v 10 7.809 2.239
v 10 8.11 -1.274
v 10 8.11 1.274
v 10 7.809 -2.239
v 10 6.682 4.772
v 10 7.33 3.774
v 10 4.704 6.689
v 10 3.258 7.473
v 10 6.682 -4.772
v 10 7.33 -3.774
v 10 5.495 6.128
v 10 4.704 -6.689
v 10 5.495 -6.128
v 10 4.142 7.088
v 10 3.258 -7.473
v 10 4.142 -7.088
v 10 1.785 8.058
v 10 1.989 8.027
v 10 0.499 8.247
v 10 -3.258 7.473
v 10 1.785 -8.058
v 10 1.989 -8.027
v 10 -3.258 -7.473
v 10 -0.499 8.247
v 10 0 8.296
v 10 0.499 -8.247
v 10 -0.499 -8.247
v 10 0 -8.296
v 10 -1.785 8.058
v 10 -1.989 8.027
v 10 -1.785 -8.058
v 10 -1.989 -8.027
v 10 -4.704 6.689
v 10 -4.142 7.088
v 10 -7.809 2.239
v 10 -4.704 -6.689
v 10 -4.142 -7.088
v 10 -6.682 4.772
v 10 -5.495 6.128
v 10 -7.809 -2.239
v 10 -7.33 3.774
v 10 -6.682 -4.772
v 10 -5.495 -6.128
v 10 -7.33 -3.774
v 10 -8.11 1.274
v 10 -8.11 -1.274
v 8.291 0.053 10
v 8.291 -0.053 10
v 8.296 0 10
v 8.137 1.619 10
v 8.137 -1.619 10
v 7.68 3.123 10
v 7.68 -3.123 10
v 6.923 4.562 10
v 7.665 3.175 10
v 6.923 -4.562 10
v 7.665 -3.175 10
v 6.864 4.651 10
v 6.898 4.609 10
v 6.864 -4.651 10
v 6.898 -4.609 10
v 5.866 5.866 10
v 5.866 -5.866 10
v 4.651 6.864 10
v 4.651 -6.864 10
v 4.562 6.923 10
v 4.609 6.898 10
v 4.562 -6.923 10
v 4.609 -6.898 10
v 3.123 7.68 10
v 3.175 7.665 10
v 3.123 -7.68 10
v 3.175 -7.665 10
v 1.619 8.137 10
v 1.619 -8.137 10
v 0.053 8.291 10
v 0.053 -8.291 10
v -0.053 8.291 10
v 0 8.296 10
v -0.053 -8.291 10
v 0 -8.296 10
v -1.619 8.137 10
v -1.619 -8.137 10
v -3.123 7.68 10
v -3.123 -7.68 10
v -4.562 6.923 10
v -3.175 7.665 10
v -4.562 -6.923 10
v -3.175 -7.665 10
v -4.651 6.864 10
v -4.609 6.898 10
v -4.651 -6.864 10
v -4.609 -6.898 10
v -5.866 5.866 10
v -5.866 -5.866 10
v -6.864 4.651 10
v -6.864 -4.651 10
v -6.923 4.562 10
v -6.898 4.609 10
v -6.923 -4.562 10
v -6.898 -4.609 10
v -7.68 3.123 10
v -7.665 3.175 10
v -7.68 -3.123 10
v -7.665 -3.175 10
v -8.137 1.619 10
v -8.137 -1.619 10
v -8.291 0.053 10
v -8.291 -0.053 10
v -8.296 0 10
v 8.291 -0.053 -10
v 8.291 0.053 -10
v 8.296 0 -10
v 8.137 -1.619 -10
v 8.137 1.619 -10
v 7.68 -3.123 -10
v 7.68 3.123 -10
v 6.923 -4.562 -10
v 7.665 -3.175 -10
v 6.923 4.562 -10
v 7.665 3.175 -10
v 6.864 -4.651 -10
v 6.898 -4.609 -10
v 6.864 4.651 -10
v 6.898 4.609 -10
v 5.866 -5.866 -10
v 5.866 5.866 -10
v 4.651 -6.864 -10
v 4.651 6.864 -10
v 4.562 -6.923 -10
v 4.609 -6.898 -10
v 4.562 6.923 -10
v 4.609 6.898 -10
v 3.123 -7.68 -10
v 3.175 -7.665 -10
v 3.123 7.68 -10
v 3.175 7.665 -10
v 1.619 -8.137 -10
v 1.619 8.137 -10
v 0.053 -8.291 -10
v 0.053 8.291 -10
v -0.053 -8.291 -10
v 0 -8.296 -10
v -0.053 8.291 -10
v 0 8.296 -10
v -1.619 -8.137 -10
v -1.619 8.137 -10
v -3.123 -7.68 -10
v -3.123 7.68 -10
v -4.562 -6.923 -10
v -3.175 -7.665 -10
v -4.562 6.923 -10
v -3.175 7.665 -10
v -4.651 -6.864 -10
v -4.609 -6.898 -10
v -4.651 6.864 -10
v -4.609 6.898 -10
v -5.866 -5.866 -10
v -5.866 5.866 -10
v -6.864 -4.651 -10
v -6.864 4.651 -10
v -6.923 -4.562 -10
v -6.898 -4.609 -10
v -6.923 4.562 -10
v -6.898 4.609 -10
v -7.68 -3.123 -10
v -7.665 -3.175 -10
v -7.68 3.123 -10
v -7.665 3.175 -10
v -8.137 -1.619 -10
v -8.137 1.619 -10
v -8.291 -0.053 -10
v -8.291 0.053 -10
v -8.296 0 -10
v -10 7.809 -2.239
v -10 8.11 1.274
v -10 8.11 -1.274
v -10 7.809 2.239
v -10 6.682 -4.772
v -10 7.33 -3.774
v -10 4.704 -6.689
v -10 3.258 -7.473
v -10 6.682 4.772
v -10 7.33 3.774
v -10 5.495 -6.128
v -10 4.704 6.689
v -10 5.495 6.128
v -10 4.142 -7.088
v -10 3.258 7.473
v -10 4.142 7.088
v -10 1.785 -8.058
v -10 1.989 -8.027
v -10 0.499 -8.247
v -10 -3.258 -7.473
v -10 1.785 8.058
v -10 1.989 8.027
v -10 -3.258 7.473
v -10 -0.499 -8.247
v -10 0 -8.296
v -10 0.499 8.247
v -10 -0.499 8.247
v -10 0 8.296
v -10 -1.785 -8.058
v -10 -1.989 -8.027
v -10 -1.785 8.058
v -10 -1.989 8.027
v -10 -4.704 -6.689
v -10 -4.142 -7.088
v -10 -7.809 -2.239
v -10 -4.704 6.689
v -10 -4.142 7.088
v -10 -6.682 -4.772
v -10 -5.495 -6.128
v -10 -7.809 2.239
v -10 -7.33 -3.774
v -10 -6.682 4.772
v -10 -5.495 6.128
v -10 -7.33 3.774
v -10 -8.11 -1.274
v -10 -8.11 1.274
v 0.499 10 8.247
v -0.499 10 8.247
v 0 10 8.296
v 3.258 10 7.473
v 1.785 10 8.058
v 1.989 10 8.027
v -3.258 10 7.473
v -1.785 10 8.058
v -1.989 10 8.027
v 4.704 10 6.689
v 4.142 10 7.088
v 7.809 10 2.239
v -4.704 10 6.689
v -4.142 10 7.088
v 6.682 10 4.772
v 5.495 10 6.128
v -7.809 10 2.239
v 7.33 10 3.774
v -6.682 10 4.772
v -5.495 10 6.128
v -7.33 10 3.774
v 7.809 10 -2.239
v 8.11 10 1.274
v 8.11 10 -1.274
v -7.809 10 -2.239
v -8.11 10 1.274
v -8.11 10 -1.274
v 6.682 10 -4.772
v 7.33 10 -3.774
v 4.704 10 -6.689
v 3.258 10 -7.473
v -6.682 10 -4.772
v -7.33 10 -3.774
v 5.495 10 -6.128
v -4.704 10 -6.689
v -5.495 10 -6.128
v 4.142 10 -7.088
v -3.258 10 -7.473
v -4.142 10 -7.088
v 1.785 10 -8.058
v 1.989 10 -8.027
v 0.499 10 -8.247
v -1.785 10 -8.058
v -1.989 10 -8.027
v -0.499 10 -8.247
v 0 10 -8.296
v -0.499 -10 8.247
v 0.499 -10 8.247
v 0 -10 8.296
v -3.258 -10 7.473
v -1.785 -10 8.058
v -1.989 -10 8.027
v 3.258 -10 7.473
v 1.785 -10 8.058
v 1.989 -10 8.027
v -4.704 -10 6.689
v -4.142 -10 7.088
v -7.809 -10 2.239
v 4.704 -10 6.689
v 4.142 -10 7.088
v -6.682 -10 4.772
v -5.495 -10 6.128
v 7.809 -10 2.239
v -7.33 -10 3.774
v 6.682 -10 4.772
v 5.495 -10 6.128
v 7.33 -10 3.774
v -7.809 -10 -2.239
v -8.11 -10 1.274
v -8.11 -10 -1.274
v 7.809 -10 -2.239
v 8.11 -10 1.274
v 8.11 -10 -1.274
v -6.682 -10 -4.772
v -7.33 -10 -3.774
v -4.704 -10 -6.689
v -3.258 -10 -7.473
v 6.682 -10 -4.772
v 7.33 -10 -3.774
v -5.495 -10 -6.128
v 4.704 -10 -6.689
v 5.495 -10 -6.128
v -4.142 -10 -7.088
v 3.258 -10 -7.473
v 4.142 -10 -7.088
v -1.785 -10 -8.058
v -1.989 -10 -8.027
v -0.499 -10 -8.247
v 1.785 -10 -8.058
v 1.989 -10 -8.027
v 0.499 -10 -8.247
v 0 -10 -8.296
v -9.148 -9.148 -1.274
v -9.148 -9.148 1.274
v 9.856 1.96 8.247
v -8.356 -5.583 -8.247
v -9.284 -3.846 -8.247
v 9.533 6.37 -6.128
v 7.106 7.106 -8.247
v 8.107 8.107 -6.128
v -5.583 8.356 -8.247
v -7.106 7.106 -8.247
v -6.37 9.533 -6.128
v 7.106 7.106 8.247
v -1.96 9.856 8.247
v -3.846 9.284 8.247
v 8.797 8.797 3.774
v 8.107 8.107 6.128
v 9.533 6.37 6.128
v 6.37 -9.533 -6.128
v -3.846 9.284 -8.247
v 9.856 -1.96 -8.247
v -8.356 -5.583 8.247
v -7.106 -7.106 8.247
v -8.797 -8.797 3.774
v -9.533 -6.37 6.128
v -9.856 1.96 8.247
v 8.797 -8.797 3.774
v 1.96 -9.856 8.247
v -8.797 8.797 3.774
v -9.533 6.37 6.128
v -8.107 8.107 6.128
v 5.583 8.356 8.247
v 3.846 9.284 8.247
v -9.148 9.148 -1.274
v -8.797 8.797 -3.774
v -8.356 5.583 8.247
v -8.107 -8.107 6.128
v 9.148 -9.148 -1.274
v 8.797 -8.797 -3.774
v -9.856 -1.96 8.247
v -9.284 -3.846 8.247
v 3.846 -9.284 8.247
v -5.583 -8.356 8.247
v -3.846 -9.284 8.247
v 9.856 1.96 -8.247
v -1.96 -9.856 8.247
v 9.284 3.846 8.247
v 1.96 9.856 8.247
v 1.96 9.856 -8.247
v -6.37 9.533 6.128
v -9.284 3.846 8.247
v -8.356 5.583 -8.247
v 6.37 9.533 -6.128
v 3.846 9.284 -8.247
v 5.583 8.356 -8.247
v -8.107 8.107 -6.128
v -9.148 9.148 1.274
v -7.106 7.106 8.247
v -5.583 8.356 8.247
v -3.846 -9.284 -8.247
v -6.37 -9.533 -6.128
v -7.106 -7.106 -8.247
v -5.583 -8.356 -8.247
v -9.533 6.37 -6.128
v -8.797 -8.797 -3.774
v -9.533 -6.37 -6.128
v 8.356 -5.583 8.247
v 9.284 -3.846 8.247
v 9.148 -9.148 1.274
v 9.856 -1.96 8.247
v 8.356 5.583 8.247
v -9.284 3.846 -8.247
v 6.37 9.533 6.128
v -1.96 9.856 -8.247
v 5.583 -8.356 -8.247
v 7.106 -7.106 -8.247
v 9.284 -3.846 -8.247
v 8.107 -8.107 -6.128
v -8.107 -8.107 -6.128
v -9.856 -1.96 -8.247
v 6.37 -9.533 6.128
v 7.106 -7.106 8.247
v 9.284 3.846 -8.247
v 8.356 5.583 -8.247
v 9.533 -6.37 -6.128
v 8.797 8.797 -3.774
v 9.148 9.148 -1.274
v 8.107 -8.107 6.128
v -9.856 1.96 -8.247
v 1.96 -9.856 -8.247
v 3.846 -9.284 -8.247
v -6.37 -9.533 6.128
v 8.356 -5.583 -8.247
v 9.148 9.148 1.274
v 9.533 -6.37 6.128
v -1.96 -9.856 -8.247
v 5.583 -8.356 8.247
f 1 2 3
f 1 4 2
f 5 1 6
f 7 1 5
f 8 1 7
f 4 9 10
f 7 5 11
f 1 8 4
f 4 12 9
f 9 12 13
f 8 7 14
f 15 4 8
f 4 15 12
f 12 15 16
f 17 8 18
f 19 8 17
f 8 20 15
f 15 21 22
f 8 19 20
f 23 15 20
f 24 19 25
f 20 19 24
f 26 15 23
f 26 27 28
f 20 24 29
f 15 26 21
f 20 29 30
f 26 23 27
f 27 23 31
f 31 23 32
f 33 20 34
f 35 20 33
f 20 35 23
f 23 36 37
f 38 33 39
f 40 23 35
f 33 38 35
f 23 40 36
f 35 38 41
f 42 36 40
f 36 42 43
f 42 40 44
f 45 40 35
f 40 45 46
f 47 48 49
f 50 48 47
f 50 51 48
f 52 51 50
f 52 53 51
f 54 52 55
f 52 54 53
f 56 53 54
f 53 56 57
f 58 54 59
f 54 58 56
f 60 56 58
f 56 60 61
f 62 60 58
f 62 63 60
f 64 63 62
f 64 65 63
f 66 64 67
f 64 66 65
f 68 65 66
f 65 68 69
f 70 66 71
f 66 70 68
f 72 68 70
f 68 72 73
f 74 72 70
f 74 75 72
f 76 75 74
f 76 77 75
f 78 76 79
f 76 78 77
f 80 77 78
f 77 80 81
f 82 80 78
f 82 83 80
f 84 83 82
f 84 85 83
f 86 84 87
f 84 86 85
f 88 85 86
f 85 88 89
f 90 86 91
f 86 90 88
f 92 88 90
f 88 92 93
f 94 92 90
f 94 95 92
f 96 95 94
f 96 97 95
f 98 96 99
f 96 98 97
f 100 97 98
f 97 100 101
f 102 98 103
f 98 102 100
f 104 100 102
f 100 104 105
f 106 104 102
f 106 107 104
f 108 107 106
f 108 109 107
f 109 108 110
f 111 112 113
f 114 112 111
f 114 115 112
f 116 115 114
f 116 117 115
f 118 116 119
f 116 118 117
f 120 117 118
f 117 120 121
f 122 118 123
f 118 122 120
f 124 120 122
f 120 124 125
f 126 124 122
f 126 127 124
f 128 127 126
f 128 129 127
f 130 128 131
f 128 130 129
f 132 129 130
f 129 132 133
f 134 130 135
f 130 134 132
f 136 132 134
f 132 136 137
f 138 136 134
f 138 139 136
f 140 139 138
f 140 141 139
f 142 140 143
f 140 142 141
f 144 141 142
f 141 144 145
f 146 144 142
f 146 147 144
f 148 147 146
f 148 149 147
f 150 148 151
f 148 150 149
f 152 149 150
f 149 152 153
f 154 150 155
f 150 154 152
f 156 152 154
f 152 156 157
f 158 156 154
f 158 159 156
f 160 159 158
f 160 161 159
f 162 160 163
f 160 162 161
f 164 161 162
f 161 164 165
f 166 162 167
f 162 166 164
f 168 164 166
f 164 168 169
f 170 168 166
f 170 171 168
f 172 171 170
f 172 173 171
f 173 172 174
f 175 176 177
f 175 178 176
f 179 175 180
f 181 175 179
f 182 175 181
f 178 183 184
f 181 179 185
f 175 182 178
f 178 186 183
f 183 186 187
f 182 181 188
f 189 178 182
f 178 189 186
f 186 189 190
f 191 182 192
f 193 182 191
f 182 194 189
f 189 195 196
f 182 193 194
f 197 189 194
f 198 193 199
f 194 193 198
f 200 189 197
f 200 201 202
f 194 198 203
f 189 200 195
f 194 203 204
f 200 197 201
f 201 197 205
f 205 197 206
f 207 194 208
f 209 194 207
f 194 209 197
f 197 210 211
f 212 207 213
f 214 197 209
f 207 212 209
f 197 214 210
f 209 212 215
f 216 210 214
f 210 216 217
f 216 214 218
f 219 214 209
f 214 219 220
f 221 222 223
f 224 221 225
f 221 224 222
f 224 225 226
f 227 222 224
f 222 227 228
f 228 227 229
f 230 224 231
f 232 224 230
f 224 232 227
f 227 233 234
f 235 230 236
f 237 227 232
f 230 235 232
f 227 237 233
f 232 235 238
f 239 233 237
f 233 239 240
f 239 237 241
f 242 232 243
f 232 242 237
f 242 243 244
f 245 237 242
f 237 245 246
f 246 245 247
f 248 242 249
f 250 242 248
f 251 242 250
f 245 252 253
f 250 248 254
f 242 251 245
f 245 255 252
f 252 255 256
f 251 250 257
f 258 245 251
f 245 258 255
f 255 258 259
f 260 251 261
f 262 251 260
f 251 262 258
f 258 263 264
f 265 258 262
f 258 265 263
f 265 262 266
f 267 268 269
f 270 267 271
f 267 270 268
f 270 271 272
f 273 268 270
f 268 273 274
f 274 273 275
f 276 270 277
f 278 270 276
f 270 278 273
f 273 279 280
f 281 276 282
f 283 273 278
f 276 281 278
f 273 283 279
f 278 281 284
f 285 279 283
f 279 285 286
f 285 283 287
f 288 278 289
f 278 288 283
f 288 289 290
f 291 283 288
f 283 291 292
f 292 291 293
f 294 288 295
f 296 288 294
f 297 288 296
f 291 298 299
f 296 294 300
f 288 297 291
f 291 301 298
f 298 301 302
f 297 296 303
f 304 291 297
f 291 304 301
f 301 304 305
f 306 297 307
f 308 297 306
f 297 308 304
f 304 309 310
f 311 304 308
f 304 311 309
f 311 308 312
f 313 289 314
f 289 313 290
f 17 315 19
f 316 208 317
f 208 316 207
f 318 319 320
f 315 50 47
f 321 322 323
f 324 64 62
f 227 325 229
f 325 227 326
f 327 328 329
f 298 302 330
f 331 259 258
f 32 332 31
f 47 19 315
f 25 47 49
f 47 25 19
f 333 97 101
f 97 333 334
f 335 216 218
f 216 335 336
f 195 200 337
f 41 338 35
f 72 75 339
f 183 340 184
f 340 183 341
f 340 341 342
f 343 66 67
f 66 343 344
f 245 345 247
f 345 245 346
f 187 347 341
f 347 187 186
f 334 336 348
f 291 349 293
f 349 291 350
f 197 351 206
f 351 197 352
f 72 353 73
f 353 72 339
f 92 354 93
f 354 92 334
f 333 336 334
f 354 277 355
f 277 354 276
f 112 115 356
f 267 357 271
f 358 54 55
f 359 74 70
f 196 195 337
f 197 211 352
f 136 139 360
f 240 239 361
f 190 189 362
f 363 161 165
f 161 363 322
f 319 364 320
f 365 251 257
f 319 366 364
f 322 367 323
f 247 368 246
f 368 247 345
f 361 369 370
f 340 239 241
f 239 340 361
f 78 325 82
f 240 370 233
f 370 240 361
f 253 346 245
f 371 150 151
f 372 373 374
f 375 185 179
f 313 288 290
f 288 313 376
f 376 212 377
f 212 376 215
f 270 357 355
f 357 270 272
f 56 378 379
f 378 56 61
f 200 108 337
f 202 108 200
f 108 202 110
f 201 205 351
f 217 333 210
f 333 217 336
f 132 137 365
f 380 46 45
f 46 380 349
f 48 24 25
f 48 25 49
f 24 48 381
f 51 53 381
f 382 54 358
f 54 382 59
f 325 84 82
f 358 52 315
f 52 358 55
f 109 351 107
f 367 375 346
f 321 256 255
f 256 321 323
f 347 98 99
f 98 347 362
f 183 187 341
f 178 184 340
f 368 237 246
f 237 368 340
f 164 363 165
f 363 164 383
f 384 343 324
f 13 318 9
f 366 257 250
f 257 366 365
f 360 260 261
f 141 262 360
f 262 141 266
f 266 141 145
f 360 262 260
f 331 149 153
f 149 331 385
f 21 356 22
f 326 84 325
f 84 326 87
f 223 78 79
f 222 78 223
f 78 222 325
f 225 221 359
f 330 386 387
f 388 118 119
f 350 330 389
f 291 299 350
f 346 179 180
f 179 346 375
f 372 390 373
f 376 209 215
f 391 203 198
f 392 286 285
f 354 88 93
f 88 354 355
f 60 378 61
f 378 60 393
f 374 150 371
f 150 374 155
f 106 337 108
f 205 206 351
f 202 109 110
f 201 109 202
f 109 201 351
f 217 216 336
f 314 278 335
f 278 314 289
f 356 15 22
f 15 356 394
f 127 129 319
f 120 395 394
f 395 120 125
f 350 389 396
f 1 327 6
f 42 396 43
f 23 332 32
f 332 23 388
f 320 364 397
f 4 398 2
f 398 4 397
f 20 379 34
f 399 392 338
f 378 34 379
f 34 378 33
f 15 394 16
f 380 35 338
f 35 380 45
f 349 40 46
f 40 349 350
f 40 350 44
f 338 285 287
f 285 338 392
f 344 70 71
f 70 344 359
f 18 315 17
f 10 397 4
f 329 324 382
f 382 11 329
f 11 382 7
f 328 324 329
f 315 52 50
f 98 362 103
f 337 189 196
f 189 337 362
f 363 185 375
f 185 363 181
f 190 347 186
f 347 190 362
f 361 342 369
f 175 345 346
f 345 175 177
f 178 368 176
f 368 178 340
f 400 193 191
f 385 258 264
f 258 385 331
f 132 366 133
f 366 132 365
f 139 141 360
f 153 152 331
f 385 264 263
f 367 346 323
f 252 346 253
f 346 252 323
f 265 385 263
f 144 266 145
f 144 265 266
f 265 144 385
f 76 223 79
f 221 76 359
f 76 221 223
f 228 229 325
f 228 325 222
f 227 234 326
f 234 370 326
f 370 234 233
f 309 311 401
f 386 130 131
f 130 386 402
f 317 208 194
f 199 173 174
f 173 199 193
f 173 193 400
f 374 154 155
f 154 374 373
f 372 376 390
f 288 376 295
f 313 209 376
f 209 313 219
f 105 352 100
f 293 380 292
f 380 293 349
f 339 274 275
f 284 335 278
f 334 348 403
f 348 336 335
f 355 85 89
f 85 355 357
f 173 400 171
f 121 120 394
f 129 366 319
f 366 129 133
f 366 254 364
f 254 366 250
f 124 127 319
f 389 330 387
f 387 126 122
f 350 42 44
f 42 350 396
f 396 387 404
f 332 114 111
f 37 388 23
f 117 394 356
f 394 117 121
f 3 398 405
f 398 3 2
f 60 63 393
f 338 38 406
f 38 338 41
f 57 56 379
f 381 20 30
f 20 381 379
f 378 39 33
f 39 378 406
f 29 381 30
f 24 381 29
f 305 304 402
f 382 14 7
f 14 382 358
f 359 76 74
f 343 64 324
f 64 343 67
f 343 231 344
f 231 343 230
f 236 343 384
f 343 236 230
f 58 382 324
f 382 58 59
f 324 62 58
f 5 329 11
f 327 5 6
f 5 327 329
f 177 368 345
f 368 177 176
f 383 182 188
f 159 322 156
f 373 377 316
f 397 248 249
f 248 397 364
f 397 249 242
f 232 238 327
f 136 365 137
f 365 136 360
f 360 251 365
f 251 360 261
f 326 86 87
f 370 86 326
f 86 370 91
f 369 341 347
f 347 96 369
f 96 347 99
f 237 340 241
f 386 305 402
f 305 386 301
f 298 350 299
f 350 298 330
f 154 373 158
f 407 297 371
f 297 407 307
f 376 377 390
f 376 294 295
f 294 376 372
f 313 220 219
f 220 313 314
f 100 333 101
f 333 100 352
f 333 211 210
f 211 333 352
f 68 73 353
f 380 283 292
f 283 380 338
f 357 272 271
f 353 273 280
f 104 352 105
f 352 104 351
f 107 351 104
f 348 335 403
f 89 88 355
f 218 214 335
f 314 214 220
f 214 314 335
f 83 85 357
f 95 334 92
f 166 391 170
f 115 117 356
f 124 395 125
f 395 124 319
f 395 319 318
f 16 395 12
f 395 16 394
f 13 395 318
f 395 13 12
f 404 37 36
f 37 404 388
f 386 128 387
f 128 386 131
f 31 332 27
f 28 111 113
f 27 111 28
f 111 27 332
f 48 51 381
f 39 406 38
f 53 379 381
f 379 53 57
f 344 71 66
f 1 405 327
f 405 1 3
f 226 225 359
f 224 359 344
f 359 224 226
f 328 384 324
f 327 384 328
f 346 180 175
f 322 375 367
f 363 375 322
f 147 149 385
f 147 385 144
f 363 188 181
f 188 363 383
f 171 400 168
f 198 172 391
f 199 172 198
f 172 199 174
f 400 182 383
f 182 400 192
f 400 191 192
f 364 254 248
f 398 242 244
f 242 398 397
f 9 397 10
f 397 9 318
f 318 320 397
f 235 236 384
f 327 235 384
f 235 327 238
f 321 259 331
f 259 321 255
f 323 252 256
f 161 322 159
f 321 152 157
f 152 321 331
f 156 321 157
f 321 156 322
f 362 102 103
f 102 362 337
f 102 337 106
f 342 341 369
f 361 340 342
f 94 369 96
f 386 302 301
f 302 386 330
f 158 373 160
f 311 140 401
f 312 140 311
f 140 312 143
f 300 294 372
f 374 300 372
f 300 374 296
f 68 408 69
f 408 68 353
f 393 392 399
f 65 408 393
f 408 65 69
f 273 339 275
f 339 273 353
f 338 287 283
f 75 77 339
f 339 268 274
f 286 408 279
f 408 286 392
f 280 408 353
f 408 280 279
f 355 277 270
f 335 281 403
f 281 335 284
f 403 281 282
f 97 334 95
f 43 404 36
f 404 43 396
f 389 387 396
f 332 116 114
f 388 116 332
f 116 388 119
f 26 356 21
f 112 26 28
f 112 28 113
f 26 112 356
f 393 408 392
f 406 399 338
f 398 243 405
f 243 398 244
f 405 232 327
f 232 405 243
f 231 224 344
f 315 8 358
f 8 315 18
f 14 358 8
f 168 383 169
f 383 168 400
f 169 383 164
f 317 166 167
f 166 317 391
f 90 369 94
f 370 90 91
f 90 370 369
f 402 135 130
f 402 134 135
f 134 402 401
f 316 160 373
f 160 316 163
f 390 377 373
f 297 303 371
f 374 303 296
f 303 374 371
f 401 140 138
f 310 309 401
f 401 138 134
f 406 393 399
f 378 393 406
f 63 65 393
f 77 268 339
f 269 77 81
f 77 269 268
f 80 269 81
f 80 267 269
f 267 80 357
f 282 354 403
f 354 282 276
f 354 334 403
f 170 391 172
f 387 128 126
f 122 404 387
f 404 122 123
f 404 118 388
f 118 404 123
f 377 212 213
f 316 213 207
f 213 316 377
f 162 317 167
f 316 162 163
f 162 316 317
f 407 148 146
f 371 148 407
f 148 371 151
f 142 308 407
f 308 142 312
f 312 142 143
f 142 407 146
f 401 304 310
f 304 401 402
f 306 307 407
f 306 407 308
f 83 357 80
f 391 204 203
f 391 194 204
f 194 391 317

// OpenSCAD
intersection(){ cube(20, center=true); sphere(13, $fn=32); }
